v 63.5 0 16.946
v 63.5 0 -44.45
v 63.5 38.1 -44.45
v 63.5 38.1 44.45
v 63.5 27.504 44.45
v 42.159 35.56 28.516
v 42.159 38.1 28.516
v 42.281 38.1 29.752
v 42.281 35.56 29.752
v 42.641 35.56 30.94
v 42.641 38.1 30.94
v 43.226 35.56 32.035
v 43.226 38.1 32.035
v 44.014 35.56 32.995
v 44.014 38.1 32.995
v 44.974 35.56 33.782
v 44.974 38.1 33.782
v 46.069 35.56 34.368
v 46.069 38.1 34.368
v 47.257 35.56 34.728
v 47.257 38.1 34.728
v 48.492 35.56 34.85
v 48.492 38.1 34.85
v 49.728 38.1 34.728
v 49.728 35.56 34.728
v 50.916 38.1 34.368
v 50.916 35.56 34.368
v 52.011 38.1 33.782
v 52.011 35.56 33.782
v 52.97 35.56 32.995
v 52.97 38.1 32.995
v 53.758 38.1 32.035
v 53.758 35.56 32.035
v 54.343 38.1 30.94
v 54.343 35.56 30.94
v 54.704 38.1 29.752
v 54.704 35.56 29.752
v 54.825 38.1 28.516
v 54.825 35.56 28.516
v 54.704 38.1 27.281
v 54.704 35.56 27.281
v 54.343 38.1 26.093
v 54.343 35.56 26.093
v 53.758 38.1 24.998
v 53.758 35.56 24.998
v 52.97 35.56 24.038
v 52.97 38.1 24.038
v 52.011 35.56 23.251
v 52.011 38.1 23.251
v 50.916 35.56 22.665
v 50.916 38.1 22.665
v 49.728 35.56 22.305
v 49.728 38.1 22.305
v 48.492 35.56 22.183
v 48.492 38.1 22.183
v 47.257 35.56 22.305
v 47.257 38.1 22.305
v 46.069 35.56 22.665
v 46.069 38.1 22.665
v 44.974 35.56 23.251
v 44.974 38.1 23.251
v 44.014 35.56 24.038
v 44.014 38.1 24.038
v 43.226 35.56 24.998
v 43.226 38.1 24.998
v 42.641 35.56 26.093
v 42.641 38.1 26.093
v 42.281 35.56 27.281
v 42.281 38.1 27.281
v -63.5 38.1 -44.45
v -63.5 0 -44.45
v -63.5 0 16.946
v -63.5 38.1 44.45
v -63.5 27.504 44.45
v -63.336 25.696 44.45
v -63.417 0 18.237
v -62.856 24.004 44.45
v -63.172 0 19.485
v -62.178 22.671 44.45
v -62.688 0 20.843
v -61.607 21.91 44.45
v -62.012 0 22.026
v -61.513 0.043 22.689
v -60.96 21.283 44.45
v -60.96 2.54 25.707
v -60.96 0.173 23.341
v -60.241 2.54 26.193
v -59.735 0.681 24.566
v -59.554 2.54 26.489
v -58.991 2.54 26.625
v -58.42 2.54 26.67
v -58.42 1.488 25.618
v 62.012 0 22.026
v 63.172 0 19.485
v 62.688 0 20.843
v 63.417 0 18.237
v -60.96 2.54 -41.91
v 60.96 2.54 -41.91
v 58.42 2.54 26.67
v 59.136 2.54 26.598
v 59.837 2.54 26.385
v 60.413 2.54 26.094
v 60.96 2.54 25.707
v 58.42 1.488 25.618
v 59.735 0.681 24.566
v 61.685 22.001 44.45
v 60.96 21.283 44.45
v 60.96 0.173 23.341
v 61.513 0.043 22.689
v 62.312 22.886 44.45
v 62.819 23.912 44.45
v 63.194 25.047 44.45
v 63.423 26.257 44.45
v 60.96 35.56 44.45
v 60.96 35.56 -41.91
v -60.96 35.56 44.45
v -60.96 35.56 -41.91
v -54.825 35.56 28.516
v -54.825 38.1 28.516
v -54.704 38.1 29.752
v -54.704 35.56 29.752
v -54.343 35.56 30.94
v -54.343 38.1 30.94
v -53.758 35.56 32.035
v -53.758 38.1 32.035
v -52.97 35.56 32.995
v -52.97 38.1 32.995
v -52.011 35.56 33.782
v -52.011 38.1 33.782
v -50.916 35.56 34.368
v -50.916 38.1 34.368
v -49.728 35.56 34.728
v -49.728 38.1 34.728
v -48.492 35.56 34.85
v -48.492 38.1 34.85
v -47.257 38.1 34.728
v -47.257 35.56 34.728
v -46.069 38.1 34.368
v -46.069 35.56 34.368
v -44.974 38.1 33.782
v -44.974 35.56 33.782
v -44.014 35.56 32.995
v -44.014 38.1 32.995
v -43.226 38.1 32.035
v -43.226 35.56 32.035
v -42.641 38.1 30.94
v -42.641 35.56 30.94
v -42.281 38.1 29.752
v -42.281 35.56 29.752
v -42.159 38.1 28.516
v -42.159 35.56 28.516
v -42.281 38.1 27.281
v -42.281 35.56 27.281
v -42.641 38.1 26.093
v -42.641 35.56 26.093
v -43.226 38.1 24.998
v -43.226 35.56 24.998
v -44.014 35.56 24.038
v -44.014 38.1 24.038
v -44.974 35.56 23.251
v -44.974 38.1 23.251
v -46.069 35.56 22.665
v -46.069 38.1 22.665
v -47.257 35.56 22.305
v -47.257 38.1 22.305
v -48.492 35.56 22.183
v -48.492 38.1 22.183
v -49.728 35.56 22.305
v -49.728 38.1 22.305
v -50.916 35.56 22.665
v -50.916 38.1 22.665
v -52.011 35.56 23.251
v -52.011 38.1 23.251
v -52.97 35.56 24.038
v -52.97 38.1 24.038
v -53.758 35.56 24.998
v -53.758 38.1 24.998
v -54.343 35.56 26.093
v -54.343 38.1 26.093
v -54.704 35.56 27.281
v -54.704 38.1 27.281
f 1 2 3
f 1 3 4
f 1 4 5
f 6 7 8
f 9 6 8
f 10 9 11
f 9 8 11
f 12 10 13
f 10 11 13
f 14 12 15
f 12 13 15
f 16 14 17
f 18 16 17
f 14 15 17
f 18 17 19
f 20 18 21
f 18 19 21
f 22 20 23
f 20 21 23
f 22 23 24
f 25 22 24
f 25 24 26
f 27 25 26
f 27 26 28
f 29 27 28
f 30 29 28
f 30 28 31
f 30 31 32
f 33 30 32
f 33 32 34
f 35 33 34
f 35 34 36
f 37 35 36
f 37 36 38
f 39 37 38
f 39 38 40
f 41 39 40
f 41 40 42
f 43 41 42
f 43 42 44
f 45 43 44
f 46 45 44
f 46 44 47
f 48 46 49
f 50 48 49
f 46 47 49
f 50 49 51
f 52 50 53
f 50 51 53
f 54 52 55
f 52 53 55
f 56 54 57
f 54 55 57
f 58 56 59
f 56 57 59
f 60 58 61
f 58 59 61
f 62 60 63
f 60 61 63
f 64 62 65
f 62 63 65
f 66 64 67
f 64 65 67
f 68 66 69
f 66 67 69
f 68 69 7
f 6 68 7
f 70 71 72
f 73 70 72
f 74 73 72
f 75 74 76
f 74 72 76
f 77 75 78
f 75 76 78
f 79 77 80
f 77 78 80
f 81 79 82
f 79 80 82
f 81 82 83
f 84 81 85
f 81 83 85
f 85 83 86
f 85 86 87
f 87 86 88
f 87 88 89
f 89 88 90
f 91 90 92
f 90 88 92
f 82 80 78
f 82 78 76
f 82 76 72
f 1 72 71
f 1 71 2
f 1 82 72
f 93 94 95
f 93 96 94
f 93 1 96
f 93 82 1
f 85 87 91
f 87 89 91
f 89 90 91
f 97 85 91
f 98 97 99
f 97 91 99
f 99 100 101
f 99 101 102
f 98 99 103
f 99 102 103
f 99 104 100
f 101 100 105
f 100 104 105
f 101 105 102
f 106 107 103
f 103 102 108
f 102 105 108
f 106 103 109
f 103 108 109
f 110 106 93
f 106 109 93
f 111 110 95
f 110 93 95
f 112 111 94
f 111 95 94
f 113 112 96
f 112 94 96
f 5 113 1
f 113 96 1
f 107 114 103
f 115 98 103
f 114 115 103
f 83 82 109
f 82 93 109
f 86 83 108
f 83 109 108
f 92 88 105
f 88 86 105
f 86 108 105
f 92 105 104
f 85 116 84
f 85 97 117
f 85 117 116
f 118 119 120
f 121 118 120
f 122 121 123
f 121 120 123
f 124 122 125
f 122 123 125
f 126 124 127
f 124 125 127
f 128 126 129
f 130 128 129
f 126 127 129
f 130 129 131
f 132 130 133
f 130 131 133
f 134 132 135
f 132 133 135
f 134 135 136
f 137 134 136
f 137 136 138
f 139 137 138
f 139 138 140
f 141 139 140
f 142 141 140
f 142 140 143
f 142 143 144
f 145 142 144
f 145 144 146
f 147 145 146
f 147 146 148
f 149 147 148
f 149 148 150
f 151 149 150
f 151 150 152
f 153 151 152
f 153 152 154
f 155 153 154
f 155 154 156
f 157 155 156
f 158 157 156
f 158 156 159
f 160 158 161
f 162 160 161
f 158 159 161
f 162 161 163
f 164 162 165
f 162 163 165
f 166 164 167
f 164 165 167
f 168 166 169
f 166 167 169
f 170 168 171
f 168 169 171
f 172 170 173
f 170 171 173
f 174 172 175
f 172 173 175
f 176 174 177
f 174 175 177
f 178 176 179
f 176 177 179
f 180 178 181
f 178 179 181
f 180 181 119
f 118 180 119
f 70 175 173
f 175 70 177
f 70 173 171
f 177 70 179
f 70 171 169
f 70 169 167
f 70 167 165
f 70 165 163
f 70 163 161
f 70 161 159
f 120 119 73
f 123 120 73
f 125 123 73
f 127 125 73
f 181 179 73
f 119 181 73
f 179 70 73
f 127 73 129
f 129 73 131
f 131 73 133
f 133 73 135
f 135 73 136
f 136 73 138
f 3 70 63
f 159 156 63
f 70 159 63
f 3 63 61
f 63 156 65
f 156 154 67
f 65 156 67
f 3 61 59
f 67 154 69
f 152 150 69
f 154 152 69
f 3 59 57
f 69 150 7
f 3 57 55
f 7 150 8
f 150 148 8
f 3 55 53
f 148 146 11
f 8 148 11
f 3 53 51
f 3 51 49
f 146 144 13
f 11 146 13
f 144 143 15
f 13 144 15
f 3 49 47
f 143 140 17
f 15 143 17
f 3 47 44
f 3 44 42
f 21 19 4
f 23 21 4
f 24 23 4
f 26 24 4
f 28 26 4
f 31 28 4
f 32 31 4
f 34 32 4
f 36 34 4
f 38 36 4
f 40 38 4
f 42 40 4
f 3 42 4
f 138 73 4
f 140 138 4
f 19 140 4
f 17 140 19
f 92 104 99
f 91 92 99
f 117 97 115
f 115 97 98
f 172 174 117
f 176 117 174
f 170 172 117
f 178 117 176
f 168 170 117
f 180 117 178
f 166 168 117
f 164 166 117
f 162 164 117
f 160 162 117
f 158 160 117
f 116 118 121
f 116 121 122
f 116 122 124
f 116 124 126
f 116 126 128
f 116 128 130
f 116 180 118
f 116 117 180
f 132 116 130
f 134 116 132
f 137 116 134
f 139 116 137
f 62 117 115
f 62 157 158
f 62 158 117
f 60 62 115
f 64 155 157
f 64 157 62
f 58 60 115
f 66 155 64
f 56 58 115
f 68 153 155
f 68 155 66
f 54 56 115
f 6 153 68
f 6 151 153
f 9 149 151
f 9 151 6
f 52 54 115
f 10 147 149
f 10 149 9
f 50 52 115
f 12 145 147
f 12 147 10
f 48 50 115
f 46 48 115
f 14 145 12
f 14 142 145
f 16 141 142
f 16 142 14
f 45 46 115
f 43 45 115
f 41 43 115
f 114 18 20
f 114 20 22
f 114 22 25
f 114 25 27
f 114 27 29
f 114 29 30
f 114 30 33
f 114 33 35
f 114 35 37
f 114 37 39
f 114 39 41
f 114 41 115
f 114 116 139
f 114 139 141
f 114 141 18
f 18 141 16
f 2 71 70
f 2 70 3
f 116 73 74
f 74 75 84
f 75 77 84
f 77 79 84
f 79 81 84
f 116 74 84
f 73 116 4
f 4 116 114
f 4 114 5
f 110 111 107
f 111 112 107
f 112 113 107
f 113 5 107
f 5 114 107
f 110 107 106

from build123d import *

# Parameters (mm, degrees)
F0_W        = 127
F0_H        = 88.9
F1_DEPTH    = 38.1
F2_T        = -2.54
F3_T1_DEPTH = 231.5131966309
F4_R        = 5.08
F5_R        = 6.333111045
F6_DEPTH    = 25.4


# Not quite as in the source:
# - a fillet or chamfer that OpenCascade refuses, or shapes differently, is made with other operations: its cross-section is extruded or revolved along the edge and cut away or added


with BuildPart() as f1:
    # F0 (on Front) → F1 (new body)
    with BuildSketch(Plane.XZ):
        Rectangle(F0_W, F0_H)
    extrude(amount=-F1_DEPTH)

    # F2
    f2_openings = [f1.faces().sort_by_distance(p)[0] for p in [
        (0, 19.05, 44.45),
    ]]
    offset(amount=F2_T, openings=f2_openings)

    # F3: chamfer of 20.32 on 1 edges, made by hand

    # F3_s2 → F3_t1 (cut)
    with BuildSketch(Plane.YZ.offset(-115.7565983155)):
        Polygon((0, 24.13), (20.32, 44.45), (0, 44.45), align=None)
    extrude(amount=F3_T1_DEPTH, mode=Mode.SUBTRACT)

    # F4
    f4_edges = [f1.edges().sort_by_distance(p)[0] for p in [
        (-63.5, 10.16, 34.29),
        (63.5, 10.16, 34.29),
        (0, 0, 24.13),
    ]]
    fillet(f4_edges, radius=F4_R)

    # F5 (on face) → F6 (cut)
    with BuildSketch(Plane(origin=(0, 38.1, 0), x_dir=(-1, 0, 0), z_dir=(0, 1, 0))):
        with Locations((-48.4922043979, 28.5164732486)):
            Circle(F5_R)
        with Locations((48.4922043979, 28.5164732486)):
            Circle(F5_R)
    extrude(amount=-F6_DEPTH, mode=Mode.SUBTRACT)


solid = f1.part
